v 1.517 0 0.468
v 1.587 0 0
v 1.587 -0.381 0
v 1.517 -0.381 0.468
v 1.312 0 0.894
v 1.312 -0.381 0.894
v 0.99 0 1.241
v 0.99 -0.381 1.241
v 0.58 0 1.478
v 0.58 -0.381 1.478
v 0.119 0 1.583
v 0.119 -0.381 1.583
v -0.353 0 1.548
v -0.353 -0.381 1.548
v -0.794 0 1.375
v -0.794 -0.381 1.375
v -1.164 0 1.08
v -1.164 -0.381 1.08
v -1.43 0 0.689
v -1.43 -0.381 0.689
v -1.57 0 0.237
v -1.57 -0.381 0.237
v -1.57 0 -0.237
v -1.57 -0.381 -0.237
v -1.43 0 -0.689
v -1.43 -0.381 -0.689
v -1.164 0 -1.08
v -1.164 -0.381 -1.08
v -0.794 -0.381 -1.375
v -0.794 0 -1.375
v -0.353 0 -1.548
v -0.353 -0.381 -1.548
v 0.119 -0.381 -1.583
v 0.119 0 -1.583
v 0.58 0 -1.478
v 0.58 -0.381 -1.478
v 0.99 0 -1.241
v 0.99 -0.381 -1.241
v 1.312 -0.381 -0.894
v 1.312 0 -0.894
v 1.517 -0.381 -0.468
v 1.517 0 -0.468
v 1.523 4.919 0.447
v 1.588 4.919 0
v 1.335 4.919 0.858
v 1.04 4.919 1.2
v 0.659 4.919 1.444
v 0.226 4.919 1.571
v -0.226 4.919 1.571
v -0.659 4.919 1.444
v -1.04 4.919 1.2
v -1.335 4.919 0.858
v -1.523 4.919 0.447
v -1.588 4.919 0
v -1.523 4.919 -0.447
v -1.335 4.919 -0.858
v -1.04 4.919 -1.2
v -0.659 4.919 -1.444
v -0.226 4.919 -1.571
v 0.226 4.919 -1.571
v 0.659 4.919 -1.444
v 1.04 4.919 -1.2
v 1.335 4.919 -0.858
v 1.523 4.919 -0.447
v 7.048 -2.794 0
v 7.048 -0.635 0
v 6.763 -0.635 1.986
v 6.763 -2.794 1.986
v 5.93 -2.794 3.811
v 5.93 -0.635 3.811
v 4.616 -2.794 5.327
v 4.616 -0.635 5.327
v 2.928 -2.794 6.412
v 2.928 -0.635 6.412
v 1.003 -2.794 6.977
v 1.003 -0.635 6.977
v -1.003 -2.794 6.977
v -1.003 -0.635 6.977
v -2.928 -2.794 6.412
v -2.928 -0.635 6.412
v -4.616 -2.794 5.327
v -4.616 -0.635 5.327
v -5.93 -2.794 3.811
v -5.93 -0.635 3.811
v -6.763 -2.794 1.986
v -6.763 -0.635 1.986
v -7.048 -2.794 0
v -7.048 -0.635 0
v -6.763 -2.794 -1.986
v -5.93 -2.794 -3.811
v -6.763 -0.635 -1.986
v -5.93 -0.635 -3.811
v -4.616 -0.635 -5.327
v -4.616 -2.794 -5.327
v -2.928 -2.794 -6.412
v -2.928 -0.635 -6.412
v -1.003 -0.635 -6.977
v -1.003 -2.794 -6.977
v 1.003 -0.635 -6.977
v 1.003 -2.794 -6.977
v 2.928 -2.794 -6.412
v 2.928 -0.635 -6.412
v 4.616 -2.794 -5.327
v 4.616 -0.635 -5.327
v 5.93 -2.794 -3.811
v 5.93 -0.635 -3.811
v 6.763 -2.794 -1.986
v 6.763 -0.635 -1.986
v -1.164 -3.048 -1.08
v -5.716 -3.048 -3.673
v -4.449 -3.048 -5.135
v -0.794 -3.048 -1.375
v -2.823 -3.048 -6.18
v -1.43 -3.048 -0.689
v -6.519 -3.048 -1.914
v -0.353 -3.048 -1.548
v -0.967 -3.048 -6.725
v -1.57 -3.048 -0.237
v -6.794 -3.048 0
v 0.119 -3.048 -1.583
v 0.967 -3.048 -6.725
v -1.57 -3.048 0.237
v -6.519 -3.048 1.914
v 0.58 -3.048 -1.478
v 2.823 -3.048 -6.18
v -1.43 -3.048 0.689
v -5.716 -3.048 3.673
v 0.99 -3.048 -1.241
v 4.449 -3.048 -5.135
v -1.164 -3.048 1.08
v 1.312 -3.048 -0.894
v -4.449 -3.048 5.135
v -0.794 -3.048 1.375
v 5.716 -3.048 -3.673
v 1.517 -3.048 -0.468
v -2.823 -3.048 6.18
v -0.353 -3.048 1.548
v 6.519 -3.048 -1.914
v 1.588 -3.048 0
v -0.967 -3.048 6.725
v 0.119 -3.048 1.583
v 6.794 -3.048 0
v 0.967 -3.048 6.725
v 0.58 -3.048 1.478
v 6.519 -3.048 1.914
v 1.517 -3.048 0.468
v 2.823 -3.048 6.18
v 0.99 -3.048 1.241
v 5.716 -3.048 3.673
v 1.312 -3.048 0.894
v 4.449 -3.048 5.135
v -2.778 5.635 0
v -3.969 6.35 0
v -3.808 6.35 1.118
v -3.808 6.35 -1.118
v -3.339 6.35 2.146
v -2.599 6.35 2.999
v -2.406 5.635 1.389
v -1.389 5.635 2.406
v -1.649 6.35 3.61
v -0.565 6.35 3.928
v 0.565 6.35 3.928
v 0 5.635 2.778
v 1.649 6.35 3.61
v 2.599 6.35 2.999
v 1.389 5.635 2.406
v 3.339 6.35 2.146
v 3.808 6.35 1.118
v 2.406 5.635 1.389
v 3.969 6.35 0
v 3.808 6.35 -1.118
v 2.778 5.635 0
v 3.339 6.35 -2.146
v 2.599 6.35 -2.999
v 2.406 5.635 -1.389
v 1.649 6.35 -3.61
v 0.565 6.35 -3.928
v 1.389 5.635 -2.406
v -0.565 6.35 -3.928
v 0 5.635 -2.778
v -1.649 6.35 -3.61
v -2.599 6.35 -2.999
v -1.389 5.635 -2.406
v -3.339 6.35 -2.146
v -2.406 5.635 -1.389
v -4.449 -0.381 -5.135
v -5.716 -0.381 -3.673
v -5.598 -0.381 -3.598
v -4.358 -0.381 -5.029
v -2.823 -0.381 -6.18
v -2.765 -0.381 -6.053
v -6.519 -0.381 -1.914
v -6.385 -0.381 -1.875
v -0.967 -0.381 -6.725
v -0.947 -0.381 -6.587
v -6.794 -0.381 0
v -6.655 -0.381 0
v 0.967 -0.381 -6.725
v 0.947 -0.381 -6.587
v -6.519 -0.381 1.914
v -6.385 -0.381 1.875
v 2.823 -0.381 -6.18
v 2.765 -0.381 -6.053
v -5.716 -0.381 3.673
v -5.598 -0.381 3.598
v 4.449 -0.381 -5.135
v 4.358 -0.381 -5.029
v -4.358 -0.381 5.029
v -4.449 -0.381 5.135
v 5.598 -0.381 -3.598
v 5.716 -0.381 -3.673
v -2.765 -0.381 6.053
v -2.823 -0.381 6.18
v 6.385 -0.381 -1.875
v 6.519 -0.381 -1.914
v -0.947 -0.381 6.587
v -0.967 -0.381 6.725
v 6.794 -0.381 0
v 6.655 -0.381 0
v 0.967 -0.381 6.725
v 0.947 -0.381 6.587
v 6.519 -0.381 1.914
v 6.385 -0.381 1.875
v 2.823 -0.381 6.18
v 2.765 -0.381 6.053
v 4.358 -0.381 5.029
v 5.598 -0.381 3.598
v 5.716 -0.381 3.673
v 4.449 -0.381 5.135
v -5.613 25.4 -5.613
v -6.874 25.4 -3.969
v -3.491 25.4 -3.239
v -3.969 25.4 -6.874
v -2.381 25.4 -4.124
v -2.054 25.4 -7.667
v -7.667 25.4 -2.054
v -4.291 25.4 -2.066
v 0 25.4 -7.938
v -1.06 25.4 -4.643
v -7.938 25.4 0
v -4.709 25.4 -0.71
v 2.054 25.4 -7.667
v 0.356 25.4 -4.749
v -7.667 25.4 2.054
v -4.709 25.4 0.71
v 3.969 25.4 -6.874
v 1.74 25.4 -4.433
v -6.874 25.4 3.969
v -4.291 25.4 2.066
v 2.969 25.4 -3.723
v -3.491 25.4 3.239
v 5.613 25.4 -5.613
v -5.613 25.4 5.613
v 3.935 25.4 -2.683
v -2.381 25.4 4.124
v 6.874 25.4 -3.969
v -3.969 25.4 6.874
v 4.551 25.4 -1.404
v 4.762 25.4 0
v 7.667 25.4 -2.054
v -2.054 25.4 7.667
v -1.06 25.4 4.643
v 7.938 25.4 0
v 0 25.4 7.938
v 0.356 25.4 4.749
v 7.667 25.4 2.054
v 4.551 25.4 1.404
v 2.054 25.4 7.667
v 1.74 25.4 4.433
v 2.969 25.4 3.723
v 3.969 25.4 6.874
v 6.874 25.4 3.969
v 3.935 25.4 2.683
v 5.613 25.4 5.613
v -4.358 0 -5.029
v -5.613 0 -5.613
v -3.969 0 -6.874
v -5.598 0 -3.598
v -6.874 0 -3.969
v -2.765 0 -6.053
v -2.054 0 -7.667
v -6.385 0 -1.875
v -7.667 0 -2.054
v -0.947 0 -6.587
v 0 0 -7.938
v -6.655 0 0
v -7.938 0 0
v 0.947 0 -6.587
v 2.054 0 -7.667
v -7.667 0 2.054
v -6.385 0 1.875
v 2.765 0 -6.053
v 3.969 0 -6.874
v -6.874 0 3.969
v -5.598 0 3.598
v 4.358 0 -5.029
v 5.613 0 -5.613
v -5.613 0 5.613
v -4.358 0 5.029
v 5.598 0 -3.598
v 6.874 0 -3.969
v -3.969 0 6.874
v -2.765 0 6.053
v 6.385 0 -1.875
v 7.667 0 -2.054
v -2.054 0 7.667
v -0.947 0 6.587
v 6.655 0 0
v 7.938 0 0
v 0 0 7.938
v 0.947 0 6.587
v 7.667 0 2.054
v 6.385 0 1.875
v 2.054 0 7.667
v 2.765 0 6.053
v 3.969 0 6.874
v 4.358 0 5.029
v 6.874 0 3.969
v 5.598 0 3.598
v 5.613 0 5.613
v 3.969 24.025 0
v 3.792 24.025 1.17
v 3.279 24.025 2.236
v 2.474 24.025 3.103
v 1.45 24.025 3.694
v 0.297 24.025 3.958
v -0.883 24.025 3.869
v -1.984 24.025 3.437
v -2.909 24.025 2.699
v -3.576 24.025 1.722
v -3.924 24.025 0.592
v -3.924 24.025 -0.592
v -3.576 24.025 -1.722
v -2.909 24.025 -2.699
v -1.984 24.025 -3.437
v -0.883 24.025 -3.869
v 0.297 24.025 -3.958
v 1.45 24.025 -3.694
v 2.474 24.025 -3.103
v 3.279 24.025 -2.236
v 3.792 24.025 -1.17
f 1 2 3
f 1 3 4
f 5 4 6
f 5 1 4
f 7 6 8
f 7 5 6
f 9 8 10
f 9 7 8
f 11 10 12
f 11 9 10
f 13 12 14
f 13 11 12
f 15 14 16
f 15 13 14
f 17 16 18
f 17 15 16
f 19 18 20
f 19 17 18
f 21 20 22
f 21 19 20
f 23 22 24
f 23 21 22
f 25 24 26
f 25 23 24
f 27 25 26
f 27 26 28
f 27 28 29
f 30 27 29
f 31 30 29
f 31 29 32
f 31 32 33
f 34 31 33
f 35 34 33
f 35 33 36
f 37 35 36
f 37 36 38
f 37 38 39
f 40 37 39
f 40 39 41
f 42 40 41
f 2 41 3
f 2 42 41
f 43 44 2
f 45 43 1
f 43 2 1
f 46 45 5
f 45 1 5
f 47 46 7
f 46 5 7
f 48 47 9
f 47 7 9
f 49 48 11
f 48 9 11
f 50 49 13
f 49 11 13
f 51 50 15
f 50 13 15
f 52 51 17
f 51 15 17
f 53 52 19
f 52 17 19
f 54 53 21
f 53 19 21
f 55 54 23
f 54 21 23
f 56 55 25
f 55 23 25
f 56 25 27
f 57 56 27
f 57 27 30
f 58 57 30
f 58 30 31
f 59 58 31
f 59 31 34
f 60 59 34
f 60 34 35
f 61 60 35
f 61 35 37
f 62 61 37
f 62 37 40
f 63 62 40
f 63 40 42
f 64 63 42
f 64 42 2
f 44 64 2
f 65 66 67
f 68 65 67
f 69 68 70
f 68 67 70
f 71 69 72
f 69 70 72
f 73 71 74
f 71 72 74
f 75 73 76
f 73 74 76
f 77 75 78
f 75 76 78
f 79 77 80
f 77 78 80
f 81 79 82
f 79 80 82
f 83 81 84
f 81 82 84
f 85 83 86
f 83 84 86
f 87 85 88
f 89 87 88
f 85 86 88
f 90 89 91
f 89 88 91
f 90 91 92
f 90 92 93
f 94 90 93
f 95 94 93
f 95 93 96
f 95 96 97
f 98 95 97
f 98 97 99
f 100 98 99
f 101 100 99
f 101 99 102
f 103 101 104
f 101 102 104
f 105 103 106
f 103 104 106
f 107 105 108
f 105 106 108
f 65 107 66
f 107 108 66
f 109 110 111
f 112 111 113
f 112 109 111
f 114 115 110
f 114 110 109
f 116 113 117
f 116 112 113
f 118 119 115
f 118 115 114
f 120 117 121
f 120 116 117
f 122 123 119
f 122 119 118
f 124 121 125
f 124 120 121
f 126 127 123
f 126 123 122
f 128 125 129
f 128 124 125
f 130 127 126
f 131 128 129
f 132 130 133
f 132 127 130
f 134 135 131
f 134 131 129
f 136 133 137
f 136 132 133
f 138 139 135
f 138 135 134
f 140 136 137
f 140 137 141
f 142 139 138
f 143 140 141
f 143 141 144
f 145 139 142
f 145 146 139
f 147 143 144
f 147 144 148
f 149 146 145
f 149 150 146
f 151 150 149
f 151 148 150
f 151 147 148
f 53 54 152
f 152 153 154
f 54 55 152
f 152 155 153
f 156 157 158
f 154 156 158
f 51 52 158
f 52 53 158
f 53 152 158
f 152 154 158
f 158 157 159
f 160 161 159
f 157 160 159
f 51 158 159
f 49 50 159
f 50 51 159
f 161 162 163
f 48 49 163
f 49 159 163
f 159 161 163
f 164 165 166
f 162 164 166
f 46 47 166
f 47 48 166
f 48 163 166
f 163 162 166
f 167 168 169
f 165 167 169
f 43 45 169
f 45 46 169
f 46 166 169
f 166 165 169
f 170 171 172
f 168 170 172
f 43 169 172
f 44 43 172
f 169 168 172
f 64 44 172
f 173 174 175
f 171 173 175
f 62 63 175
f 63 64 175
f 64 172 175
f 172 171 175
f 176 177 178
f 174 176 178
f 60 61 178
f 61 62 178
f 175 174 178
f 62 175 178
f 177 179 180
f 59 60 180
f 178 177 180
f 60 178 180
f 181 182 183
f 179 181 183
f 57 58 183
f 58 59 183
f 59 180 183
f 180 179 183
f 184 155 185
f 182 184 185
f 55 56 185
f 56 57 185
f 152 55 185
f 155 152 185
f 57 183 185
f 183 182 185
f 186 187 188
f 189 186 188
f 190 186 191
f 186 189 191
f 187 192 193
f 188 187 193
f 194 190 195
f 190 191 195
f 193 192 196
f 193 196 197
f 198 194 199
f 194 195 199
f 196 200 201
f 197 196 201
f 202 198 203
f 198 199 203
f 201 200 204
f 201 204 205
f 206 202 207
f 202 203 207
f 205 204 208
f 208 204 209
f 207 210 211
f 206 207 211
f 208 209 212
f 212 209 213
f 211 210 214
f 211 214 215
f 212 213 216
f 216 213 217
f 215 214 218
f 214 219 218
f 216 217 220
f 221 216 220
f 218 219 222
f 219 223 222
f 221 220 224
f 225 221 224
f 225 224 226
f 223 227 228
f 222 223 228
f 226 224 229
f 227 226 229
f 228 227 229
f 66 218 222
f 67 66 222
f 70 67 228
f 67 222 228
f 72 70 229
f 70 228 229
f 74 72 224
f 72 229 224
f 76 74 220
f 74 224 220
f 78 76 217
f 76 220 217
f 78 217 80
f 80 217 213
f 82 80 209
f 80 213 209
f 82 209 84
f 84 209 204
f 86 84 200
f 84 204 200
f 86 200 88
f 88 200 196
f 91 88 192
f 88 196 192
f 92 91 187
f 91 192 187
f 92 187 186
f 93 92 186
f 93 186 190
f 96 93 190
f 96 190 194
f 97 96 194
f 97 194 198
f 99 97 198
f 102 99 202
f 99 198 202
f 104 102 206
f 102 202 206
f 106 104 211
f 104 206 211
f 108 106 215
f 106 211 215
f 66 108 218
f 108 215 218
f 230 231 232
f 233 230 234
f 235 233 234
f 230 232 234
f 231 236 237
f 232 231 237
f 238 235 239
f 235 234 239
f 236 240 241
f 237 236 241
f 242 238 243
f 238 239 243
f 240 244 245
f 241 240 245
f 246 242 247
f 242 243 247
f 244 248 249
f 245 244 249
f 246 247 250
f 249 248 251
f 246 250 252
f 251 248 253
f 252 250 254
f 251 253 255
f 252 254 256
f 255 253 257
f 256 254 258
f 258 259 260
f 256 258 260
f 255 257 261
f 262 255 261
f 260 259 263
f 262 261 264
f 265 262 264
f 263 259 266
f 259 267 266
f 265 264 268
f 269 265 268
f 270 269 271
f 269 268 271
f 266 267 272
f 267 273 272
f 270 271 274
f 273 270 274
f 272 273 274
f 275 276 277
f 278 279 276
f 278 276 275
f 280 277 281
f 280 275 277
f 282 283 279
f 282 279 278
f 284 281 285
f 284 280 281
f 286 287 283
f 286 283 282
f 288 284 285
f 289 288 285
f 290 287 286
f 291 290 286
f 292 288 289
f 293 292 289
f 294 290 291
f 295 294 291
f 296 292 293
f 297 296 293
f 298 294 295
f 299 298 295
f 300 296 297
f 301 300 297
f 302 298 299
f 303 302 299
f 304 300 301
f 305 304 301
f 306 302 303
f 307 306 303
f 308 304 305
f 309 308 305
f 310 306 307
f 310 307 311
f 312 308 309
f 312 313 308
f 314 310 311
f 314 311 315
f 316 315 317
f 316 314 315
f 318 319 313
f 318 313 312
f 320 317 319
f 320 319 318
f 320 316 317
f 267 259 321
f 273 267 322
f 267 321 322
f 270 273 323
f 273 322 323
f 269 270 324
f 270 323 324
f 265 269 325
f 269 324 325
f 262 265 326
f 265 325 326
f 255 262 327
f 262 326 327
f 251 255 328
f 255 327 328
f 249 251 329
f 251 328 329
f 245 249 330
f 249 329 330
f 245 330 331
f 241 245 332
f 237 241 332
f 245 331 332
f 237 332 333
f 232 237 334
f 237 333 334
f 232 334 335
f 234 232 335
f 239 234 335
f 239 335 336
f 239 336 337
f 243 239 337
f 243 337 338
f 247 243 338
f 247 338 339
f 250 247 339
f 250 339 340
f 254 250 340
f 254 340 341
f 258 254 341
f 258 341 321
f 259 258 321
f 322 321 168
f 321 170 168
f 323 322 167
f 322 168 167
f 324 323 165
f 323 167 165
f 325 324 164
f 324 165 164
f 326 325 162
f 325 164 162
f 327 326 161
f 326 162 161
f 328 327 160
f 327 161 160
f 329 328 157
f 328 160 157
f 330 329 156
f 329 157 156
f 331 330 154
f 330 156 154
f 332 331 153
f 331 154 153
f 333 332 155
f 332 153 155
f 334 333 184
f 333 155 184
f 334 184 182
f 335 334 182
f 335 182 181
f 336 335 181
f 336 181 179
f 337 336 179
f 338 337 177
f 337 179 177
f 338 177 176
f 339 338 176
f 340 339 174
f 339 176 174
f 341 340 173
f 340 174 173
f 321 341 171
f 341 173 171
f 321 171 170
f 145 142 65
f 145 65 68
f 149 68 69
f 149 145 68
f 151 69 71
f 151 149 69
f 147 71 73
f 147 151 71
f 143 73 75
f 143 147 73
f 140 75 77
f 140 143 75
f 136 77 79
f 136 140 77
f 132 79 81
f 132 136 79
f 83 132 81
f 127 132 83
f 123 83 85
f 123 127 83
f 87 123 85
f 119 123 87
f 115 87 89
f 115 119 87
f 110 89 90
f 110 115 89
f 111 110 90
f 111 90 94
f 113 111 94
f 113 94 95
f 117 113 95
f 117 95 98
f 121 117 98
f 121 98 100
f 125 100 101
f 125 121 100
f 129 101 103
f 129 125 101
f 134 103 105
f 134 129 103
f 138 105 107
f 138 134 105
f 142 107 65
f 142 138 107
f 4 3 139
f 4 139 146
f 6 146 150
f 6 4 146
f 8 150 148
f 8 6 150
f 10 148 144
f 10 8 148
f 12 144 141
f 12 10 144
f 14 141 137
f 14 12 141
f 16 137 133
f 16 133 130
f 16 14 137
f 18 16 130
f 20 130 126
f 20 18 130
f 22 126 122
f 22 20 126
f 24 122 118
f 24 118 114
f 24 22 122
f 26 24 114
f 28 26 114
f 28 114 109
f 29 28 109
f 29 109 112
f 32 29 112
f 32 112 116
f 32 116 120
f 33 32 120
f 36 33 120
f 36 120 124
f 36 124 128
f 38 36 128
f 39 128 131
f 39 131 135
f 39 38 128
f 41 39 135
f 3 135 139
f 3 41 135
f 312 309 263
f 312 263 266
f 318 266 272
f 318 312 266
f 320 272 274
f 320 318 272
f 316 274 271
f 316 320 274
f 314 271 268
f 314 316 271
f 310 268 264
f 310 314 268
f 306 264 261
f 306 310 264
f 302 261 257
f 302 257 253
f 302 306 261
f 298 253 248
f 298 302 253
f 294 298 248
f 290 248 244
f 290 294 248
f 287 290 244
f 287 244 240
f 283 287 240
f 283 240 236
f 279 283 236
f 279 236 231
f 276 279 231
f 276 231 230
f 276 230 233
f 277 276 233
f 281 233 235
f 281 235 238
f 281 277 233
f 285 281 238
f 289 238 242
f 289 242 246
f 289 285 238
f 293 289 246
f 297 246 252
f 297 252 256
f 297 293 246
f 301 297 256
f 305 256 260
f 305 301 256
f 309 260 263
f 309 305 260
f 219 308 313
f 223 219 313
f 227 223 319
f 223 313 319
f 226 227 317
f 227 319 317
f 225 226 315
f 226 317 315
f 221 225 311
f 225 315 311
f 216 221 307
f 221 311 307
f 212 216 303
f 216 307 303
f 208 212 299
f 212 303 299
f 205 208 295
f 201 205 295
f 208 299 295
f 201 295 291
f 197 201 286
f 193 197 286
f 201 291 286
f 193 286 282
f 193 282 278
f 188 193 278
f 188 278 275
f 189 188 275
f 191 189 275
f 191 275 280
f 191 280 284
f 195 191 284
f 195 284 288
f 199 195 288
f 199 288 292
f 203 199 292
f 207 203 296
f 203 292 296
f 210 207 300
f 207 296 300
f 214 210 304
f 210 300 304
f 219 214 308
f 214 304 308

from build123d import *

# Parameters (mm, degrees)
F0_R           = 7.9375
F0_R_2         = 6.6548
F0_R_3         = 1.5875
F1_DEPTH       = 25.4
F3_D           = 7.9375
F3_DEPTH       = 19.05
F3_CSINK_D     = 9.525
F3_CSINK_ANGLE = 60
F3_TIP         = 2.3846655818
F4_DEPTH       = 0.381
F5_R           = 7.0485
F5_R_2         = 1.5875
F6_DEPTH       = 2.667
F7_SIZE        = 0.254


with BuildPart() as f1:
    # F0 (on Front) → F1 (new body)
    with BuildSketch(Plane.XZ):
        Circle(F0_R)
        Circle(F0_R_2, mode=Mode.SUBTRACT)
        Circle(F0_R_2)
        Circle(F0_R_3, mode=Mode.SUBTRACT)
    extrude(amount=-F1_DEPTH)

    # F3
    with Locations(Plane(origin=(0, 25.4, 0), x_dir=(-1, 0, 0), z_dir=(0, 1, 0))):
        with Locations((0, 0)):
            CounterSinkHole(F3_D / 2, F3_CSINK_D / 2, depth=F3_DEPTH, counter_sink_angle=F3_CSINK_ANGLE)
            with Locations((0, 0, -(F3_DEPTH + F3_TIP / 2))):  # 118° drill point
                Cone(0, F3_D / 2, F3_TIP, mode=Mode.SUBTRACT)

    # F0 (on Front) → F4 (join)
    with BuildSketch(Plane.XZ):
        Circle(F0_R_2)
        Circle(F0_R_3, mode=Mode.SUBTRACT)
    extrude(amount=F4_DEPTH)

    # F5 (on face) → F6 (join)
    with BuildSketch(Plane.XZ.offset(0.381)):
        Circle(F5_R)
        Circle(F5_R_2, mode=Mode.SUBTRACT)
    extrude(amount=F6_DEPTH)

    # F7
    f7_edges = [f1.edges().sort_by_distance(p)[0] for p in [
        (-7.0485, -3.048, 0),
        (-7.0485, -0.381, 0),
    ]]
    chamfer(f7_edges, length=F7_SIZE)


solid = f1.part
